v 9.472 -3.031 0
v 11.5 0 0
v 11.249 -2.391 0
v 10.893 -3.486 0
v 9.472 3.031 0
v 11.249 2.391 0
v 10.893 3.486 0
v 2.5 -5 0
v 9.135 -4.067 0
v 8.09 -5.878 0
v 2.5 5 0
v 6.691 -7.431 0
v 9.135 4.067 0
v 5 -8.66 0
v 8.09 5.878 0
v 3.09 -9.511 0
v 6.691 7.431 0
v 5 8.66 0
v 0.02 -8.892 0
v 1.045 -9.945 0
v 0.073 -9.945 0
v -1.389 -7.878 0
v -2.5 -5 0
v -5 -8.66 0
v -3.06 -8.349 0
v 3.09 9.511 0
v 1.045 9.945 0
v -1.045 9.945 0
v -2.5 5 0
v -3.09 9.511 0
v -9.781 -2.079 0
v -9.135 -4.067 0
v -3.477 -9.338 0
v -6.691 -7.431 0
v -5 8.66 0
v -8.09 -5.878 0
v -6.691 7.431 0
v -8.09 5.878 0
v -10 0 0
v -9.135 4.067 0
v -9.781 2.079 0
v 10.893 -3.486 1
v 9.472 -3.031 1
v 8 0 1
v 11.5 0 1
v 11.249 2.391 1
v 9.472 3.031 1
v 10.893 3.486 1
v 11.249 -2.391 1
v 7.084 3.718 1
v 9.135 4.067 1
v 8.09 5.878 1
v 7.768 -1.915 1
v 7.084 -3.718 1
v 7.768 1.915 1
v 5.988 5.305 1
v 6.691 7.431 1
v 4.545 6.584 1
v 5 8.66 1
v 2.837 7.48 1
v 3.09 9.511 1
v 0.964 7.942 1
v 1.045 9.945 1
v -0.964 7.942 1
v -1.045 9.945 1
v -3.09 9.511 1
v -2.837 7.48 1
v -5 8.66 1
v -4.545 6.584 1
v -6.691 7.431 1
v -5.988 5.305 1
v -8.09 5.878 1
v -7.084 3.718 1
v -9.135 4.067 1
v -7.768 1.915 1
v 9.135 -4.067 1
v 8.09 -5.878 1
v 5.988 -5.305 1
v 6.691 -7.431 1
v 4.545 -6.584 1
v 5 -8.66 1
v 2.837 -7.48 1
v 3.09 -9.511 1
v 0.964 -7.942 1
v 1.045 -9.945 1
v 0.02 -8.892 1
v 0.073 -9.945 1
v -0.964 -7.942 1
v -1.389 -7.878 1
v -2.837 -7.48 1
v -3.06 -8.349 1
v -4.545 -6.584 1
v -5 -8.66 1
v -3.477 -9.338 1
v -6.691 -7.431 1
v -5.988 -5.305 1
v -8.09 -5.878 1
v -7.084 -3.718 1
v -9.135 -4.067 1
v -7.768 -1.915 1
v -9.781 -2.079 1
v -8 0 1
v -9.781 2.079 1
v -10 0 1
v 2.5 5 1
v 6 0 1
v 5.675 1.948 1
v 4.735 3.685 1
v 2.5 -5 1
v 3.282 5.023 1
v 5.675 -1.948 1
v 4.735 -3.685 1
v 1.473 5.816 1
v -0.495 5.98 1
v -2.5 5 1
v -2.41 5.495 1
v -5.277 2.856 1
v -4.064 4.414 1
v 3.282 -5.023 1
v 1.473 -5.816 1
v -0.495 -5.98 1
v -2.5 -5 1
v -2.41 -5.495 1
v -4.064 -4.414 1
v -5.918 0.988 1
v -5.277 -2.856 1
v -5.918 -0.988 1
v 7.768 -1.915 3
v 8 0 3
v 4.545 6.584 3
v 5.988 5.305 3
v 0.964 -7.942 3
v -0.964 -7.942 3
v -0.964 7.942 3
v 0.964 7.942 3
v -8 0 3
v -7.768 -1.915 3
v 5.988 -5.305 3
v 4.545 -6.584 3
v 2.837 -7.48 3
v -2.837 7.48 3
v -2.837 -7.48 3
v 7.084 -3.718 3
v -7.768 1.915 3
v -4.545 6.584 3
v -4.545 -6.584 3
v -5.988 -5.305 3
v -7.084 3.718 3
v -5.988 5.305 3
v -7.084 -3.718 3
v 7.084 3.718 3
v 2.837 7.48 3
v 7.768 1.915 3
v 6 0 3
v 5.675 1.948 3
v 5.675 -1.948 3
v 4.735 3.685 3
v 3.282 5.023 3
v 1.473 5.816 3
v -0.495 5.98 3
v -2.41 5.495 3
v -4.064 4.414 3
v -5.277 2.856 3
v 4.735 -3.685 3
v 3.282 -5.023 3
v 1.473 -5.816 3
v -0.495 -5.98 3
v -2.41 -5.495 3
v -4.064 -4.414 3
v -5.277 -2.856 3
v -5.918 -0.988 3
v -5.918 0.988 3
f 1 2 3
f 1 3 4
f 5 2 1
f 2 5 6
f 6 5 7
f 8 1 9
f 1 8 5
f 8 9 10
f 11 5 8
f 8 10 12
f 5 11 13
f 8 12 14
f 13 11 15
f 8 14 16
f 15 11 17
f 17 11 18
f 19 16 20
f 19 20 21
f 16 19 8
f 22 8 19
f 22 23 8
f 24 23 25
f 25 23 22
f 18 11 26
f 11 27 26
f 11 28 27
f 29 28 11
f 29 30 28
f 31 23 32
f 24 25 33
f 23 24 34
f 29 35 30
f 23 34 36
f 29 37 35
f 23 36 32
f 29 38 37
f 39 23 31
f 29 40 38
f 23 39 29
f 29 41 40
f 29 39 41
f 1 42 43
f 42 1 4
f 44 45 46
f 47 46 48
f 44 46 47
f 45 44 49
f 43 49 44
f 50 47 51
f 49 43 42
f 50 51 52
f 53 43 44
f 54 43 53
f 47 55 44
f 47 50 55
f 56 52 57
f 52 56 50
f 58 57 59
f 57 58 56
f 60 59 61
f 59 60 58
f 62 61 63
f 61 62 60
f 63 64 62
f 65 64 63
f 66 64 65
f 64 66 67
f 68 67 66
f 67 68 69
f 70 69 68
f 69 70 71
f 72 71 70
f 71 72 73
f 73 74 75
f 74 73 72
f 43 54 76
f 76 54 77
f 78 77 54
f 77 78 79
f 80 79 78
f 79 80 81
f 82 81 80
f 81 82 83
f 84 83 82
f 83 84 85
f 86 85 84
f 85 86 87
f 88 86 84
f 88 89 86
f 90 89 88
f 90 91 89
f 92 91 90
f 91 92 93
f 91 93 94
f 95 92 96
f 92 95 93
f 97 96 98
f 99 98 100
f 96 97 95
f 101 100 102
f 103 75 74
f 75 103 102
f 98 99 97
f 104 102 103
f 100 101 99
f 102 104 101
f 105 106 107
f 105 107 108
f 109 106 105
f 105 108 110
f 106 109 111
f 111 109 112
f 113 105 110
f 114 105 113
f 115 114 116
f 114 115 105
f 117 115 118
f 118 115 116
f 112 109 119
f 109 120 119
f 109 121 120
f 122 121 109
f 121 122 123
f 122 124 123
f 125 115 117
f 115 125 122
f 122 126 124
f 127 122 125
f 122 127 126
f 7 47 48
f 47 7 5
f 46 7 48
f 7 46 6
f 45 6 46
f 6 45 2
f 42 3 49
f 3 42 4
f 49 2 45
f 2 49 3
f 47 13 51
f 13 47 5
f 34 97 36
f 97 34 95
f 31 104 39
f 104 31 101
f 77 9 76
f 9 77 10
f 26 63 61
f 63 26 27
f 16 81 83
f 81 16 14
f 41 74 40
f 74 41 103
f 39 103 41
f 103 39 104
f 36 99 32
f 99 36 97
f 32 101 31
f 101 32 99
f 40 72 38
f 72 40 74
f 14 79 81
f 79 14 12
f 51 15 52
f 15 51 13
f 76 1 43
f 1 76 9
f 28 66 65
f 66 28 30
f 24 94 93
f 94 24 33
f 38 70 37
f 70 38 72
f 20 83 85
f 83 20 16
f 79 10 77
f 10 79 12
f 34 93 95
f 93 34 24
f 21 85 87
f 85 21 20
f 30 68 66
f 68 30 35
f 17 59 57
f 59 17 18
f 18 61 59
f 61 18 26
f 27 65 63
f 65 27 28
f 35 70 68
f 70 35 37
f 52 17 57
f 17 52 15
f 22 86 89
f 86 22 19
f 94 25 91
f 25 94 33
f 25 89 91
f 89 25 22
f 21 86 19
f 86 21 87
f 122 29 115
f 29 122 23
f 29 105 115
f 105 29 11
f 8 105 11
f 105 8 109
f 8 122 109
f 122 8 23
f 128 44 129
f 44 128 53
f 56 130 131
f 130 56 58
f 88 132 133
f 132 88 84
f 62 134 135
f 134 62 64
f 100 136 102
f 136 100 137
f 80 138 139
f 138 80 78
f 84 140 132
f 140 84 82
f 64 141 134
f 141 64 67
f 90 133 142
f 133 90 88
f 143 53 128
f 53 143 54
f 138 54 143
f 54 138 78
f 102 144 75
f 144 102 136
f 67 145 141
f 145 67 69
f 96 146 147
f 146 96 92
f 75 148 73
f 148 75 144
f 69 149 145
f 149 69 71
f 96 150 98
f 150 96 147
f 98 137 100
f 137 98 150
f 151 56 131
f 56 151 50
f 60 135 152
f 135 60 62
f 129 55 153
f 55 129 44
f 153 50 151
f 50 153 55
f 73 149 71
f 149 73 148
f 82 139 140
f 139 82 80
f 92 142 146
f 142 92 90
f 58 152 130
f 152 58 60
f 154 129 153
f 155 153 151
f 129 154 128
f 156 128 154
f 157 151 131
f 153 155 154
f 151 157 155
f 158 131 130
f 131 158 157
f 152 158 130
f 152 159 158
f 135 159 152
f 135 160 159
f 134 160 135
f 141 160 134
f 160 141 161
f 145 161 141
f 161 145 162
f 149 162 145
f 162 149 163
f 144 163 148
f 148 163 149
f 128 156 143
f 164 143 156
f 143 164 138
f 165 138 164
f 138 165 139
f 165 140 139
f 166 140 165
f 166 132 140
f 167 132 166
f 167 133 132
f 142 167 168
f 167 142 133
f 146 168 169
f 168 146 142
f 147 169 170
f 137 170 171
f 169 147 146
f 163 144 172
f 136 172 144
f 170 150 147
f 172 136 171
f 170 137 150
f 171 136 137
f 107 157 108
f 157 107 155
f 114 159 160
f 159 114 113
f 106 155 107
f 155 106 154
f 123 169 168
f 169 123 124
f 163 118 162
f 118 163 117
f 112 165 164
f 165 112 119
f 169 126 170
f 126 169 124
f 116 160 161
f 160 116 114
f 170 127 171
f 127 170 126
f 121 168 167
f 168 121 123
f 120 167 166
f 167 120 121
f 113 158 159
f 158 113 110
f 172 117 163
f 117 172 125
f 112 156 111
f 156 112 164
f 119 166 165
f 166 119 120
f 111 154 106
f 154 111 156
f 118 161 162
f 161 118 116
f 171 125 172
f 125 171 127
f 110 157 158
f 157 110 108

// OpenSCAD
disk(1);

module disk(cut) {

    union() {

        // Disk with Gate & Keyway
        difference() {
            // Disk with Notch
            union() {
                // Disk
                linear_extrude(1) circle(r=10);

                // Curved Notch
                intersection() {
                    linear_extrude(1)
                    polygon([[0,0], [50,-16], [50,16]]);
                    linear_extrude(1) circle(r=11.5);
                }
            }

            // Gate
            rotate([0,0,90-(10*cut)])
            translate([-10,0,-.1])
            linear_extrude(1.2) 
            circle(r=2);

            // Keyway
            translate([0,0,-.1])
            linear_extrude(10) 
            square([5,10], center=true);
        }

        // Spacers
        translate([0,0,1])
        difference() {
            linear_extrude(2) circle(r=8);
            translate([0,0,-.1])
            linear_extrude(2.2) circle(r=6);
        }

    }

}
